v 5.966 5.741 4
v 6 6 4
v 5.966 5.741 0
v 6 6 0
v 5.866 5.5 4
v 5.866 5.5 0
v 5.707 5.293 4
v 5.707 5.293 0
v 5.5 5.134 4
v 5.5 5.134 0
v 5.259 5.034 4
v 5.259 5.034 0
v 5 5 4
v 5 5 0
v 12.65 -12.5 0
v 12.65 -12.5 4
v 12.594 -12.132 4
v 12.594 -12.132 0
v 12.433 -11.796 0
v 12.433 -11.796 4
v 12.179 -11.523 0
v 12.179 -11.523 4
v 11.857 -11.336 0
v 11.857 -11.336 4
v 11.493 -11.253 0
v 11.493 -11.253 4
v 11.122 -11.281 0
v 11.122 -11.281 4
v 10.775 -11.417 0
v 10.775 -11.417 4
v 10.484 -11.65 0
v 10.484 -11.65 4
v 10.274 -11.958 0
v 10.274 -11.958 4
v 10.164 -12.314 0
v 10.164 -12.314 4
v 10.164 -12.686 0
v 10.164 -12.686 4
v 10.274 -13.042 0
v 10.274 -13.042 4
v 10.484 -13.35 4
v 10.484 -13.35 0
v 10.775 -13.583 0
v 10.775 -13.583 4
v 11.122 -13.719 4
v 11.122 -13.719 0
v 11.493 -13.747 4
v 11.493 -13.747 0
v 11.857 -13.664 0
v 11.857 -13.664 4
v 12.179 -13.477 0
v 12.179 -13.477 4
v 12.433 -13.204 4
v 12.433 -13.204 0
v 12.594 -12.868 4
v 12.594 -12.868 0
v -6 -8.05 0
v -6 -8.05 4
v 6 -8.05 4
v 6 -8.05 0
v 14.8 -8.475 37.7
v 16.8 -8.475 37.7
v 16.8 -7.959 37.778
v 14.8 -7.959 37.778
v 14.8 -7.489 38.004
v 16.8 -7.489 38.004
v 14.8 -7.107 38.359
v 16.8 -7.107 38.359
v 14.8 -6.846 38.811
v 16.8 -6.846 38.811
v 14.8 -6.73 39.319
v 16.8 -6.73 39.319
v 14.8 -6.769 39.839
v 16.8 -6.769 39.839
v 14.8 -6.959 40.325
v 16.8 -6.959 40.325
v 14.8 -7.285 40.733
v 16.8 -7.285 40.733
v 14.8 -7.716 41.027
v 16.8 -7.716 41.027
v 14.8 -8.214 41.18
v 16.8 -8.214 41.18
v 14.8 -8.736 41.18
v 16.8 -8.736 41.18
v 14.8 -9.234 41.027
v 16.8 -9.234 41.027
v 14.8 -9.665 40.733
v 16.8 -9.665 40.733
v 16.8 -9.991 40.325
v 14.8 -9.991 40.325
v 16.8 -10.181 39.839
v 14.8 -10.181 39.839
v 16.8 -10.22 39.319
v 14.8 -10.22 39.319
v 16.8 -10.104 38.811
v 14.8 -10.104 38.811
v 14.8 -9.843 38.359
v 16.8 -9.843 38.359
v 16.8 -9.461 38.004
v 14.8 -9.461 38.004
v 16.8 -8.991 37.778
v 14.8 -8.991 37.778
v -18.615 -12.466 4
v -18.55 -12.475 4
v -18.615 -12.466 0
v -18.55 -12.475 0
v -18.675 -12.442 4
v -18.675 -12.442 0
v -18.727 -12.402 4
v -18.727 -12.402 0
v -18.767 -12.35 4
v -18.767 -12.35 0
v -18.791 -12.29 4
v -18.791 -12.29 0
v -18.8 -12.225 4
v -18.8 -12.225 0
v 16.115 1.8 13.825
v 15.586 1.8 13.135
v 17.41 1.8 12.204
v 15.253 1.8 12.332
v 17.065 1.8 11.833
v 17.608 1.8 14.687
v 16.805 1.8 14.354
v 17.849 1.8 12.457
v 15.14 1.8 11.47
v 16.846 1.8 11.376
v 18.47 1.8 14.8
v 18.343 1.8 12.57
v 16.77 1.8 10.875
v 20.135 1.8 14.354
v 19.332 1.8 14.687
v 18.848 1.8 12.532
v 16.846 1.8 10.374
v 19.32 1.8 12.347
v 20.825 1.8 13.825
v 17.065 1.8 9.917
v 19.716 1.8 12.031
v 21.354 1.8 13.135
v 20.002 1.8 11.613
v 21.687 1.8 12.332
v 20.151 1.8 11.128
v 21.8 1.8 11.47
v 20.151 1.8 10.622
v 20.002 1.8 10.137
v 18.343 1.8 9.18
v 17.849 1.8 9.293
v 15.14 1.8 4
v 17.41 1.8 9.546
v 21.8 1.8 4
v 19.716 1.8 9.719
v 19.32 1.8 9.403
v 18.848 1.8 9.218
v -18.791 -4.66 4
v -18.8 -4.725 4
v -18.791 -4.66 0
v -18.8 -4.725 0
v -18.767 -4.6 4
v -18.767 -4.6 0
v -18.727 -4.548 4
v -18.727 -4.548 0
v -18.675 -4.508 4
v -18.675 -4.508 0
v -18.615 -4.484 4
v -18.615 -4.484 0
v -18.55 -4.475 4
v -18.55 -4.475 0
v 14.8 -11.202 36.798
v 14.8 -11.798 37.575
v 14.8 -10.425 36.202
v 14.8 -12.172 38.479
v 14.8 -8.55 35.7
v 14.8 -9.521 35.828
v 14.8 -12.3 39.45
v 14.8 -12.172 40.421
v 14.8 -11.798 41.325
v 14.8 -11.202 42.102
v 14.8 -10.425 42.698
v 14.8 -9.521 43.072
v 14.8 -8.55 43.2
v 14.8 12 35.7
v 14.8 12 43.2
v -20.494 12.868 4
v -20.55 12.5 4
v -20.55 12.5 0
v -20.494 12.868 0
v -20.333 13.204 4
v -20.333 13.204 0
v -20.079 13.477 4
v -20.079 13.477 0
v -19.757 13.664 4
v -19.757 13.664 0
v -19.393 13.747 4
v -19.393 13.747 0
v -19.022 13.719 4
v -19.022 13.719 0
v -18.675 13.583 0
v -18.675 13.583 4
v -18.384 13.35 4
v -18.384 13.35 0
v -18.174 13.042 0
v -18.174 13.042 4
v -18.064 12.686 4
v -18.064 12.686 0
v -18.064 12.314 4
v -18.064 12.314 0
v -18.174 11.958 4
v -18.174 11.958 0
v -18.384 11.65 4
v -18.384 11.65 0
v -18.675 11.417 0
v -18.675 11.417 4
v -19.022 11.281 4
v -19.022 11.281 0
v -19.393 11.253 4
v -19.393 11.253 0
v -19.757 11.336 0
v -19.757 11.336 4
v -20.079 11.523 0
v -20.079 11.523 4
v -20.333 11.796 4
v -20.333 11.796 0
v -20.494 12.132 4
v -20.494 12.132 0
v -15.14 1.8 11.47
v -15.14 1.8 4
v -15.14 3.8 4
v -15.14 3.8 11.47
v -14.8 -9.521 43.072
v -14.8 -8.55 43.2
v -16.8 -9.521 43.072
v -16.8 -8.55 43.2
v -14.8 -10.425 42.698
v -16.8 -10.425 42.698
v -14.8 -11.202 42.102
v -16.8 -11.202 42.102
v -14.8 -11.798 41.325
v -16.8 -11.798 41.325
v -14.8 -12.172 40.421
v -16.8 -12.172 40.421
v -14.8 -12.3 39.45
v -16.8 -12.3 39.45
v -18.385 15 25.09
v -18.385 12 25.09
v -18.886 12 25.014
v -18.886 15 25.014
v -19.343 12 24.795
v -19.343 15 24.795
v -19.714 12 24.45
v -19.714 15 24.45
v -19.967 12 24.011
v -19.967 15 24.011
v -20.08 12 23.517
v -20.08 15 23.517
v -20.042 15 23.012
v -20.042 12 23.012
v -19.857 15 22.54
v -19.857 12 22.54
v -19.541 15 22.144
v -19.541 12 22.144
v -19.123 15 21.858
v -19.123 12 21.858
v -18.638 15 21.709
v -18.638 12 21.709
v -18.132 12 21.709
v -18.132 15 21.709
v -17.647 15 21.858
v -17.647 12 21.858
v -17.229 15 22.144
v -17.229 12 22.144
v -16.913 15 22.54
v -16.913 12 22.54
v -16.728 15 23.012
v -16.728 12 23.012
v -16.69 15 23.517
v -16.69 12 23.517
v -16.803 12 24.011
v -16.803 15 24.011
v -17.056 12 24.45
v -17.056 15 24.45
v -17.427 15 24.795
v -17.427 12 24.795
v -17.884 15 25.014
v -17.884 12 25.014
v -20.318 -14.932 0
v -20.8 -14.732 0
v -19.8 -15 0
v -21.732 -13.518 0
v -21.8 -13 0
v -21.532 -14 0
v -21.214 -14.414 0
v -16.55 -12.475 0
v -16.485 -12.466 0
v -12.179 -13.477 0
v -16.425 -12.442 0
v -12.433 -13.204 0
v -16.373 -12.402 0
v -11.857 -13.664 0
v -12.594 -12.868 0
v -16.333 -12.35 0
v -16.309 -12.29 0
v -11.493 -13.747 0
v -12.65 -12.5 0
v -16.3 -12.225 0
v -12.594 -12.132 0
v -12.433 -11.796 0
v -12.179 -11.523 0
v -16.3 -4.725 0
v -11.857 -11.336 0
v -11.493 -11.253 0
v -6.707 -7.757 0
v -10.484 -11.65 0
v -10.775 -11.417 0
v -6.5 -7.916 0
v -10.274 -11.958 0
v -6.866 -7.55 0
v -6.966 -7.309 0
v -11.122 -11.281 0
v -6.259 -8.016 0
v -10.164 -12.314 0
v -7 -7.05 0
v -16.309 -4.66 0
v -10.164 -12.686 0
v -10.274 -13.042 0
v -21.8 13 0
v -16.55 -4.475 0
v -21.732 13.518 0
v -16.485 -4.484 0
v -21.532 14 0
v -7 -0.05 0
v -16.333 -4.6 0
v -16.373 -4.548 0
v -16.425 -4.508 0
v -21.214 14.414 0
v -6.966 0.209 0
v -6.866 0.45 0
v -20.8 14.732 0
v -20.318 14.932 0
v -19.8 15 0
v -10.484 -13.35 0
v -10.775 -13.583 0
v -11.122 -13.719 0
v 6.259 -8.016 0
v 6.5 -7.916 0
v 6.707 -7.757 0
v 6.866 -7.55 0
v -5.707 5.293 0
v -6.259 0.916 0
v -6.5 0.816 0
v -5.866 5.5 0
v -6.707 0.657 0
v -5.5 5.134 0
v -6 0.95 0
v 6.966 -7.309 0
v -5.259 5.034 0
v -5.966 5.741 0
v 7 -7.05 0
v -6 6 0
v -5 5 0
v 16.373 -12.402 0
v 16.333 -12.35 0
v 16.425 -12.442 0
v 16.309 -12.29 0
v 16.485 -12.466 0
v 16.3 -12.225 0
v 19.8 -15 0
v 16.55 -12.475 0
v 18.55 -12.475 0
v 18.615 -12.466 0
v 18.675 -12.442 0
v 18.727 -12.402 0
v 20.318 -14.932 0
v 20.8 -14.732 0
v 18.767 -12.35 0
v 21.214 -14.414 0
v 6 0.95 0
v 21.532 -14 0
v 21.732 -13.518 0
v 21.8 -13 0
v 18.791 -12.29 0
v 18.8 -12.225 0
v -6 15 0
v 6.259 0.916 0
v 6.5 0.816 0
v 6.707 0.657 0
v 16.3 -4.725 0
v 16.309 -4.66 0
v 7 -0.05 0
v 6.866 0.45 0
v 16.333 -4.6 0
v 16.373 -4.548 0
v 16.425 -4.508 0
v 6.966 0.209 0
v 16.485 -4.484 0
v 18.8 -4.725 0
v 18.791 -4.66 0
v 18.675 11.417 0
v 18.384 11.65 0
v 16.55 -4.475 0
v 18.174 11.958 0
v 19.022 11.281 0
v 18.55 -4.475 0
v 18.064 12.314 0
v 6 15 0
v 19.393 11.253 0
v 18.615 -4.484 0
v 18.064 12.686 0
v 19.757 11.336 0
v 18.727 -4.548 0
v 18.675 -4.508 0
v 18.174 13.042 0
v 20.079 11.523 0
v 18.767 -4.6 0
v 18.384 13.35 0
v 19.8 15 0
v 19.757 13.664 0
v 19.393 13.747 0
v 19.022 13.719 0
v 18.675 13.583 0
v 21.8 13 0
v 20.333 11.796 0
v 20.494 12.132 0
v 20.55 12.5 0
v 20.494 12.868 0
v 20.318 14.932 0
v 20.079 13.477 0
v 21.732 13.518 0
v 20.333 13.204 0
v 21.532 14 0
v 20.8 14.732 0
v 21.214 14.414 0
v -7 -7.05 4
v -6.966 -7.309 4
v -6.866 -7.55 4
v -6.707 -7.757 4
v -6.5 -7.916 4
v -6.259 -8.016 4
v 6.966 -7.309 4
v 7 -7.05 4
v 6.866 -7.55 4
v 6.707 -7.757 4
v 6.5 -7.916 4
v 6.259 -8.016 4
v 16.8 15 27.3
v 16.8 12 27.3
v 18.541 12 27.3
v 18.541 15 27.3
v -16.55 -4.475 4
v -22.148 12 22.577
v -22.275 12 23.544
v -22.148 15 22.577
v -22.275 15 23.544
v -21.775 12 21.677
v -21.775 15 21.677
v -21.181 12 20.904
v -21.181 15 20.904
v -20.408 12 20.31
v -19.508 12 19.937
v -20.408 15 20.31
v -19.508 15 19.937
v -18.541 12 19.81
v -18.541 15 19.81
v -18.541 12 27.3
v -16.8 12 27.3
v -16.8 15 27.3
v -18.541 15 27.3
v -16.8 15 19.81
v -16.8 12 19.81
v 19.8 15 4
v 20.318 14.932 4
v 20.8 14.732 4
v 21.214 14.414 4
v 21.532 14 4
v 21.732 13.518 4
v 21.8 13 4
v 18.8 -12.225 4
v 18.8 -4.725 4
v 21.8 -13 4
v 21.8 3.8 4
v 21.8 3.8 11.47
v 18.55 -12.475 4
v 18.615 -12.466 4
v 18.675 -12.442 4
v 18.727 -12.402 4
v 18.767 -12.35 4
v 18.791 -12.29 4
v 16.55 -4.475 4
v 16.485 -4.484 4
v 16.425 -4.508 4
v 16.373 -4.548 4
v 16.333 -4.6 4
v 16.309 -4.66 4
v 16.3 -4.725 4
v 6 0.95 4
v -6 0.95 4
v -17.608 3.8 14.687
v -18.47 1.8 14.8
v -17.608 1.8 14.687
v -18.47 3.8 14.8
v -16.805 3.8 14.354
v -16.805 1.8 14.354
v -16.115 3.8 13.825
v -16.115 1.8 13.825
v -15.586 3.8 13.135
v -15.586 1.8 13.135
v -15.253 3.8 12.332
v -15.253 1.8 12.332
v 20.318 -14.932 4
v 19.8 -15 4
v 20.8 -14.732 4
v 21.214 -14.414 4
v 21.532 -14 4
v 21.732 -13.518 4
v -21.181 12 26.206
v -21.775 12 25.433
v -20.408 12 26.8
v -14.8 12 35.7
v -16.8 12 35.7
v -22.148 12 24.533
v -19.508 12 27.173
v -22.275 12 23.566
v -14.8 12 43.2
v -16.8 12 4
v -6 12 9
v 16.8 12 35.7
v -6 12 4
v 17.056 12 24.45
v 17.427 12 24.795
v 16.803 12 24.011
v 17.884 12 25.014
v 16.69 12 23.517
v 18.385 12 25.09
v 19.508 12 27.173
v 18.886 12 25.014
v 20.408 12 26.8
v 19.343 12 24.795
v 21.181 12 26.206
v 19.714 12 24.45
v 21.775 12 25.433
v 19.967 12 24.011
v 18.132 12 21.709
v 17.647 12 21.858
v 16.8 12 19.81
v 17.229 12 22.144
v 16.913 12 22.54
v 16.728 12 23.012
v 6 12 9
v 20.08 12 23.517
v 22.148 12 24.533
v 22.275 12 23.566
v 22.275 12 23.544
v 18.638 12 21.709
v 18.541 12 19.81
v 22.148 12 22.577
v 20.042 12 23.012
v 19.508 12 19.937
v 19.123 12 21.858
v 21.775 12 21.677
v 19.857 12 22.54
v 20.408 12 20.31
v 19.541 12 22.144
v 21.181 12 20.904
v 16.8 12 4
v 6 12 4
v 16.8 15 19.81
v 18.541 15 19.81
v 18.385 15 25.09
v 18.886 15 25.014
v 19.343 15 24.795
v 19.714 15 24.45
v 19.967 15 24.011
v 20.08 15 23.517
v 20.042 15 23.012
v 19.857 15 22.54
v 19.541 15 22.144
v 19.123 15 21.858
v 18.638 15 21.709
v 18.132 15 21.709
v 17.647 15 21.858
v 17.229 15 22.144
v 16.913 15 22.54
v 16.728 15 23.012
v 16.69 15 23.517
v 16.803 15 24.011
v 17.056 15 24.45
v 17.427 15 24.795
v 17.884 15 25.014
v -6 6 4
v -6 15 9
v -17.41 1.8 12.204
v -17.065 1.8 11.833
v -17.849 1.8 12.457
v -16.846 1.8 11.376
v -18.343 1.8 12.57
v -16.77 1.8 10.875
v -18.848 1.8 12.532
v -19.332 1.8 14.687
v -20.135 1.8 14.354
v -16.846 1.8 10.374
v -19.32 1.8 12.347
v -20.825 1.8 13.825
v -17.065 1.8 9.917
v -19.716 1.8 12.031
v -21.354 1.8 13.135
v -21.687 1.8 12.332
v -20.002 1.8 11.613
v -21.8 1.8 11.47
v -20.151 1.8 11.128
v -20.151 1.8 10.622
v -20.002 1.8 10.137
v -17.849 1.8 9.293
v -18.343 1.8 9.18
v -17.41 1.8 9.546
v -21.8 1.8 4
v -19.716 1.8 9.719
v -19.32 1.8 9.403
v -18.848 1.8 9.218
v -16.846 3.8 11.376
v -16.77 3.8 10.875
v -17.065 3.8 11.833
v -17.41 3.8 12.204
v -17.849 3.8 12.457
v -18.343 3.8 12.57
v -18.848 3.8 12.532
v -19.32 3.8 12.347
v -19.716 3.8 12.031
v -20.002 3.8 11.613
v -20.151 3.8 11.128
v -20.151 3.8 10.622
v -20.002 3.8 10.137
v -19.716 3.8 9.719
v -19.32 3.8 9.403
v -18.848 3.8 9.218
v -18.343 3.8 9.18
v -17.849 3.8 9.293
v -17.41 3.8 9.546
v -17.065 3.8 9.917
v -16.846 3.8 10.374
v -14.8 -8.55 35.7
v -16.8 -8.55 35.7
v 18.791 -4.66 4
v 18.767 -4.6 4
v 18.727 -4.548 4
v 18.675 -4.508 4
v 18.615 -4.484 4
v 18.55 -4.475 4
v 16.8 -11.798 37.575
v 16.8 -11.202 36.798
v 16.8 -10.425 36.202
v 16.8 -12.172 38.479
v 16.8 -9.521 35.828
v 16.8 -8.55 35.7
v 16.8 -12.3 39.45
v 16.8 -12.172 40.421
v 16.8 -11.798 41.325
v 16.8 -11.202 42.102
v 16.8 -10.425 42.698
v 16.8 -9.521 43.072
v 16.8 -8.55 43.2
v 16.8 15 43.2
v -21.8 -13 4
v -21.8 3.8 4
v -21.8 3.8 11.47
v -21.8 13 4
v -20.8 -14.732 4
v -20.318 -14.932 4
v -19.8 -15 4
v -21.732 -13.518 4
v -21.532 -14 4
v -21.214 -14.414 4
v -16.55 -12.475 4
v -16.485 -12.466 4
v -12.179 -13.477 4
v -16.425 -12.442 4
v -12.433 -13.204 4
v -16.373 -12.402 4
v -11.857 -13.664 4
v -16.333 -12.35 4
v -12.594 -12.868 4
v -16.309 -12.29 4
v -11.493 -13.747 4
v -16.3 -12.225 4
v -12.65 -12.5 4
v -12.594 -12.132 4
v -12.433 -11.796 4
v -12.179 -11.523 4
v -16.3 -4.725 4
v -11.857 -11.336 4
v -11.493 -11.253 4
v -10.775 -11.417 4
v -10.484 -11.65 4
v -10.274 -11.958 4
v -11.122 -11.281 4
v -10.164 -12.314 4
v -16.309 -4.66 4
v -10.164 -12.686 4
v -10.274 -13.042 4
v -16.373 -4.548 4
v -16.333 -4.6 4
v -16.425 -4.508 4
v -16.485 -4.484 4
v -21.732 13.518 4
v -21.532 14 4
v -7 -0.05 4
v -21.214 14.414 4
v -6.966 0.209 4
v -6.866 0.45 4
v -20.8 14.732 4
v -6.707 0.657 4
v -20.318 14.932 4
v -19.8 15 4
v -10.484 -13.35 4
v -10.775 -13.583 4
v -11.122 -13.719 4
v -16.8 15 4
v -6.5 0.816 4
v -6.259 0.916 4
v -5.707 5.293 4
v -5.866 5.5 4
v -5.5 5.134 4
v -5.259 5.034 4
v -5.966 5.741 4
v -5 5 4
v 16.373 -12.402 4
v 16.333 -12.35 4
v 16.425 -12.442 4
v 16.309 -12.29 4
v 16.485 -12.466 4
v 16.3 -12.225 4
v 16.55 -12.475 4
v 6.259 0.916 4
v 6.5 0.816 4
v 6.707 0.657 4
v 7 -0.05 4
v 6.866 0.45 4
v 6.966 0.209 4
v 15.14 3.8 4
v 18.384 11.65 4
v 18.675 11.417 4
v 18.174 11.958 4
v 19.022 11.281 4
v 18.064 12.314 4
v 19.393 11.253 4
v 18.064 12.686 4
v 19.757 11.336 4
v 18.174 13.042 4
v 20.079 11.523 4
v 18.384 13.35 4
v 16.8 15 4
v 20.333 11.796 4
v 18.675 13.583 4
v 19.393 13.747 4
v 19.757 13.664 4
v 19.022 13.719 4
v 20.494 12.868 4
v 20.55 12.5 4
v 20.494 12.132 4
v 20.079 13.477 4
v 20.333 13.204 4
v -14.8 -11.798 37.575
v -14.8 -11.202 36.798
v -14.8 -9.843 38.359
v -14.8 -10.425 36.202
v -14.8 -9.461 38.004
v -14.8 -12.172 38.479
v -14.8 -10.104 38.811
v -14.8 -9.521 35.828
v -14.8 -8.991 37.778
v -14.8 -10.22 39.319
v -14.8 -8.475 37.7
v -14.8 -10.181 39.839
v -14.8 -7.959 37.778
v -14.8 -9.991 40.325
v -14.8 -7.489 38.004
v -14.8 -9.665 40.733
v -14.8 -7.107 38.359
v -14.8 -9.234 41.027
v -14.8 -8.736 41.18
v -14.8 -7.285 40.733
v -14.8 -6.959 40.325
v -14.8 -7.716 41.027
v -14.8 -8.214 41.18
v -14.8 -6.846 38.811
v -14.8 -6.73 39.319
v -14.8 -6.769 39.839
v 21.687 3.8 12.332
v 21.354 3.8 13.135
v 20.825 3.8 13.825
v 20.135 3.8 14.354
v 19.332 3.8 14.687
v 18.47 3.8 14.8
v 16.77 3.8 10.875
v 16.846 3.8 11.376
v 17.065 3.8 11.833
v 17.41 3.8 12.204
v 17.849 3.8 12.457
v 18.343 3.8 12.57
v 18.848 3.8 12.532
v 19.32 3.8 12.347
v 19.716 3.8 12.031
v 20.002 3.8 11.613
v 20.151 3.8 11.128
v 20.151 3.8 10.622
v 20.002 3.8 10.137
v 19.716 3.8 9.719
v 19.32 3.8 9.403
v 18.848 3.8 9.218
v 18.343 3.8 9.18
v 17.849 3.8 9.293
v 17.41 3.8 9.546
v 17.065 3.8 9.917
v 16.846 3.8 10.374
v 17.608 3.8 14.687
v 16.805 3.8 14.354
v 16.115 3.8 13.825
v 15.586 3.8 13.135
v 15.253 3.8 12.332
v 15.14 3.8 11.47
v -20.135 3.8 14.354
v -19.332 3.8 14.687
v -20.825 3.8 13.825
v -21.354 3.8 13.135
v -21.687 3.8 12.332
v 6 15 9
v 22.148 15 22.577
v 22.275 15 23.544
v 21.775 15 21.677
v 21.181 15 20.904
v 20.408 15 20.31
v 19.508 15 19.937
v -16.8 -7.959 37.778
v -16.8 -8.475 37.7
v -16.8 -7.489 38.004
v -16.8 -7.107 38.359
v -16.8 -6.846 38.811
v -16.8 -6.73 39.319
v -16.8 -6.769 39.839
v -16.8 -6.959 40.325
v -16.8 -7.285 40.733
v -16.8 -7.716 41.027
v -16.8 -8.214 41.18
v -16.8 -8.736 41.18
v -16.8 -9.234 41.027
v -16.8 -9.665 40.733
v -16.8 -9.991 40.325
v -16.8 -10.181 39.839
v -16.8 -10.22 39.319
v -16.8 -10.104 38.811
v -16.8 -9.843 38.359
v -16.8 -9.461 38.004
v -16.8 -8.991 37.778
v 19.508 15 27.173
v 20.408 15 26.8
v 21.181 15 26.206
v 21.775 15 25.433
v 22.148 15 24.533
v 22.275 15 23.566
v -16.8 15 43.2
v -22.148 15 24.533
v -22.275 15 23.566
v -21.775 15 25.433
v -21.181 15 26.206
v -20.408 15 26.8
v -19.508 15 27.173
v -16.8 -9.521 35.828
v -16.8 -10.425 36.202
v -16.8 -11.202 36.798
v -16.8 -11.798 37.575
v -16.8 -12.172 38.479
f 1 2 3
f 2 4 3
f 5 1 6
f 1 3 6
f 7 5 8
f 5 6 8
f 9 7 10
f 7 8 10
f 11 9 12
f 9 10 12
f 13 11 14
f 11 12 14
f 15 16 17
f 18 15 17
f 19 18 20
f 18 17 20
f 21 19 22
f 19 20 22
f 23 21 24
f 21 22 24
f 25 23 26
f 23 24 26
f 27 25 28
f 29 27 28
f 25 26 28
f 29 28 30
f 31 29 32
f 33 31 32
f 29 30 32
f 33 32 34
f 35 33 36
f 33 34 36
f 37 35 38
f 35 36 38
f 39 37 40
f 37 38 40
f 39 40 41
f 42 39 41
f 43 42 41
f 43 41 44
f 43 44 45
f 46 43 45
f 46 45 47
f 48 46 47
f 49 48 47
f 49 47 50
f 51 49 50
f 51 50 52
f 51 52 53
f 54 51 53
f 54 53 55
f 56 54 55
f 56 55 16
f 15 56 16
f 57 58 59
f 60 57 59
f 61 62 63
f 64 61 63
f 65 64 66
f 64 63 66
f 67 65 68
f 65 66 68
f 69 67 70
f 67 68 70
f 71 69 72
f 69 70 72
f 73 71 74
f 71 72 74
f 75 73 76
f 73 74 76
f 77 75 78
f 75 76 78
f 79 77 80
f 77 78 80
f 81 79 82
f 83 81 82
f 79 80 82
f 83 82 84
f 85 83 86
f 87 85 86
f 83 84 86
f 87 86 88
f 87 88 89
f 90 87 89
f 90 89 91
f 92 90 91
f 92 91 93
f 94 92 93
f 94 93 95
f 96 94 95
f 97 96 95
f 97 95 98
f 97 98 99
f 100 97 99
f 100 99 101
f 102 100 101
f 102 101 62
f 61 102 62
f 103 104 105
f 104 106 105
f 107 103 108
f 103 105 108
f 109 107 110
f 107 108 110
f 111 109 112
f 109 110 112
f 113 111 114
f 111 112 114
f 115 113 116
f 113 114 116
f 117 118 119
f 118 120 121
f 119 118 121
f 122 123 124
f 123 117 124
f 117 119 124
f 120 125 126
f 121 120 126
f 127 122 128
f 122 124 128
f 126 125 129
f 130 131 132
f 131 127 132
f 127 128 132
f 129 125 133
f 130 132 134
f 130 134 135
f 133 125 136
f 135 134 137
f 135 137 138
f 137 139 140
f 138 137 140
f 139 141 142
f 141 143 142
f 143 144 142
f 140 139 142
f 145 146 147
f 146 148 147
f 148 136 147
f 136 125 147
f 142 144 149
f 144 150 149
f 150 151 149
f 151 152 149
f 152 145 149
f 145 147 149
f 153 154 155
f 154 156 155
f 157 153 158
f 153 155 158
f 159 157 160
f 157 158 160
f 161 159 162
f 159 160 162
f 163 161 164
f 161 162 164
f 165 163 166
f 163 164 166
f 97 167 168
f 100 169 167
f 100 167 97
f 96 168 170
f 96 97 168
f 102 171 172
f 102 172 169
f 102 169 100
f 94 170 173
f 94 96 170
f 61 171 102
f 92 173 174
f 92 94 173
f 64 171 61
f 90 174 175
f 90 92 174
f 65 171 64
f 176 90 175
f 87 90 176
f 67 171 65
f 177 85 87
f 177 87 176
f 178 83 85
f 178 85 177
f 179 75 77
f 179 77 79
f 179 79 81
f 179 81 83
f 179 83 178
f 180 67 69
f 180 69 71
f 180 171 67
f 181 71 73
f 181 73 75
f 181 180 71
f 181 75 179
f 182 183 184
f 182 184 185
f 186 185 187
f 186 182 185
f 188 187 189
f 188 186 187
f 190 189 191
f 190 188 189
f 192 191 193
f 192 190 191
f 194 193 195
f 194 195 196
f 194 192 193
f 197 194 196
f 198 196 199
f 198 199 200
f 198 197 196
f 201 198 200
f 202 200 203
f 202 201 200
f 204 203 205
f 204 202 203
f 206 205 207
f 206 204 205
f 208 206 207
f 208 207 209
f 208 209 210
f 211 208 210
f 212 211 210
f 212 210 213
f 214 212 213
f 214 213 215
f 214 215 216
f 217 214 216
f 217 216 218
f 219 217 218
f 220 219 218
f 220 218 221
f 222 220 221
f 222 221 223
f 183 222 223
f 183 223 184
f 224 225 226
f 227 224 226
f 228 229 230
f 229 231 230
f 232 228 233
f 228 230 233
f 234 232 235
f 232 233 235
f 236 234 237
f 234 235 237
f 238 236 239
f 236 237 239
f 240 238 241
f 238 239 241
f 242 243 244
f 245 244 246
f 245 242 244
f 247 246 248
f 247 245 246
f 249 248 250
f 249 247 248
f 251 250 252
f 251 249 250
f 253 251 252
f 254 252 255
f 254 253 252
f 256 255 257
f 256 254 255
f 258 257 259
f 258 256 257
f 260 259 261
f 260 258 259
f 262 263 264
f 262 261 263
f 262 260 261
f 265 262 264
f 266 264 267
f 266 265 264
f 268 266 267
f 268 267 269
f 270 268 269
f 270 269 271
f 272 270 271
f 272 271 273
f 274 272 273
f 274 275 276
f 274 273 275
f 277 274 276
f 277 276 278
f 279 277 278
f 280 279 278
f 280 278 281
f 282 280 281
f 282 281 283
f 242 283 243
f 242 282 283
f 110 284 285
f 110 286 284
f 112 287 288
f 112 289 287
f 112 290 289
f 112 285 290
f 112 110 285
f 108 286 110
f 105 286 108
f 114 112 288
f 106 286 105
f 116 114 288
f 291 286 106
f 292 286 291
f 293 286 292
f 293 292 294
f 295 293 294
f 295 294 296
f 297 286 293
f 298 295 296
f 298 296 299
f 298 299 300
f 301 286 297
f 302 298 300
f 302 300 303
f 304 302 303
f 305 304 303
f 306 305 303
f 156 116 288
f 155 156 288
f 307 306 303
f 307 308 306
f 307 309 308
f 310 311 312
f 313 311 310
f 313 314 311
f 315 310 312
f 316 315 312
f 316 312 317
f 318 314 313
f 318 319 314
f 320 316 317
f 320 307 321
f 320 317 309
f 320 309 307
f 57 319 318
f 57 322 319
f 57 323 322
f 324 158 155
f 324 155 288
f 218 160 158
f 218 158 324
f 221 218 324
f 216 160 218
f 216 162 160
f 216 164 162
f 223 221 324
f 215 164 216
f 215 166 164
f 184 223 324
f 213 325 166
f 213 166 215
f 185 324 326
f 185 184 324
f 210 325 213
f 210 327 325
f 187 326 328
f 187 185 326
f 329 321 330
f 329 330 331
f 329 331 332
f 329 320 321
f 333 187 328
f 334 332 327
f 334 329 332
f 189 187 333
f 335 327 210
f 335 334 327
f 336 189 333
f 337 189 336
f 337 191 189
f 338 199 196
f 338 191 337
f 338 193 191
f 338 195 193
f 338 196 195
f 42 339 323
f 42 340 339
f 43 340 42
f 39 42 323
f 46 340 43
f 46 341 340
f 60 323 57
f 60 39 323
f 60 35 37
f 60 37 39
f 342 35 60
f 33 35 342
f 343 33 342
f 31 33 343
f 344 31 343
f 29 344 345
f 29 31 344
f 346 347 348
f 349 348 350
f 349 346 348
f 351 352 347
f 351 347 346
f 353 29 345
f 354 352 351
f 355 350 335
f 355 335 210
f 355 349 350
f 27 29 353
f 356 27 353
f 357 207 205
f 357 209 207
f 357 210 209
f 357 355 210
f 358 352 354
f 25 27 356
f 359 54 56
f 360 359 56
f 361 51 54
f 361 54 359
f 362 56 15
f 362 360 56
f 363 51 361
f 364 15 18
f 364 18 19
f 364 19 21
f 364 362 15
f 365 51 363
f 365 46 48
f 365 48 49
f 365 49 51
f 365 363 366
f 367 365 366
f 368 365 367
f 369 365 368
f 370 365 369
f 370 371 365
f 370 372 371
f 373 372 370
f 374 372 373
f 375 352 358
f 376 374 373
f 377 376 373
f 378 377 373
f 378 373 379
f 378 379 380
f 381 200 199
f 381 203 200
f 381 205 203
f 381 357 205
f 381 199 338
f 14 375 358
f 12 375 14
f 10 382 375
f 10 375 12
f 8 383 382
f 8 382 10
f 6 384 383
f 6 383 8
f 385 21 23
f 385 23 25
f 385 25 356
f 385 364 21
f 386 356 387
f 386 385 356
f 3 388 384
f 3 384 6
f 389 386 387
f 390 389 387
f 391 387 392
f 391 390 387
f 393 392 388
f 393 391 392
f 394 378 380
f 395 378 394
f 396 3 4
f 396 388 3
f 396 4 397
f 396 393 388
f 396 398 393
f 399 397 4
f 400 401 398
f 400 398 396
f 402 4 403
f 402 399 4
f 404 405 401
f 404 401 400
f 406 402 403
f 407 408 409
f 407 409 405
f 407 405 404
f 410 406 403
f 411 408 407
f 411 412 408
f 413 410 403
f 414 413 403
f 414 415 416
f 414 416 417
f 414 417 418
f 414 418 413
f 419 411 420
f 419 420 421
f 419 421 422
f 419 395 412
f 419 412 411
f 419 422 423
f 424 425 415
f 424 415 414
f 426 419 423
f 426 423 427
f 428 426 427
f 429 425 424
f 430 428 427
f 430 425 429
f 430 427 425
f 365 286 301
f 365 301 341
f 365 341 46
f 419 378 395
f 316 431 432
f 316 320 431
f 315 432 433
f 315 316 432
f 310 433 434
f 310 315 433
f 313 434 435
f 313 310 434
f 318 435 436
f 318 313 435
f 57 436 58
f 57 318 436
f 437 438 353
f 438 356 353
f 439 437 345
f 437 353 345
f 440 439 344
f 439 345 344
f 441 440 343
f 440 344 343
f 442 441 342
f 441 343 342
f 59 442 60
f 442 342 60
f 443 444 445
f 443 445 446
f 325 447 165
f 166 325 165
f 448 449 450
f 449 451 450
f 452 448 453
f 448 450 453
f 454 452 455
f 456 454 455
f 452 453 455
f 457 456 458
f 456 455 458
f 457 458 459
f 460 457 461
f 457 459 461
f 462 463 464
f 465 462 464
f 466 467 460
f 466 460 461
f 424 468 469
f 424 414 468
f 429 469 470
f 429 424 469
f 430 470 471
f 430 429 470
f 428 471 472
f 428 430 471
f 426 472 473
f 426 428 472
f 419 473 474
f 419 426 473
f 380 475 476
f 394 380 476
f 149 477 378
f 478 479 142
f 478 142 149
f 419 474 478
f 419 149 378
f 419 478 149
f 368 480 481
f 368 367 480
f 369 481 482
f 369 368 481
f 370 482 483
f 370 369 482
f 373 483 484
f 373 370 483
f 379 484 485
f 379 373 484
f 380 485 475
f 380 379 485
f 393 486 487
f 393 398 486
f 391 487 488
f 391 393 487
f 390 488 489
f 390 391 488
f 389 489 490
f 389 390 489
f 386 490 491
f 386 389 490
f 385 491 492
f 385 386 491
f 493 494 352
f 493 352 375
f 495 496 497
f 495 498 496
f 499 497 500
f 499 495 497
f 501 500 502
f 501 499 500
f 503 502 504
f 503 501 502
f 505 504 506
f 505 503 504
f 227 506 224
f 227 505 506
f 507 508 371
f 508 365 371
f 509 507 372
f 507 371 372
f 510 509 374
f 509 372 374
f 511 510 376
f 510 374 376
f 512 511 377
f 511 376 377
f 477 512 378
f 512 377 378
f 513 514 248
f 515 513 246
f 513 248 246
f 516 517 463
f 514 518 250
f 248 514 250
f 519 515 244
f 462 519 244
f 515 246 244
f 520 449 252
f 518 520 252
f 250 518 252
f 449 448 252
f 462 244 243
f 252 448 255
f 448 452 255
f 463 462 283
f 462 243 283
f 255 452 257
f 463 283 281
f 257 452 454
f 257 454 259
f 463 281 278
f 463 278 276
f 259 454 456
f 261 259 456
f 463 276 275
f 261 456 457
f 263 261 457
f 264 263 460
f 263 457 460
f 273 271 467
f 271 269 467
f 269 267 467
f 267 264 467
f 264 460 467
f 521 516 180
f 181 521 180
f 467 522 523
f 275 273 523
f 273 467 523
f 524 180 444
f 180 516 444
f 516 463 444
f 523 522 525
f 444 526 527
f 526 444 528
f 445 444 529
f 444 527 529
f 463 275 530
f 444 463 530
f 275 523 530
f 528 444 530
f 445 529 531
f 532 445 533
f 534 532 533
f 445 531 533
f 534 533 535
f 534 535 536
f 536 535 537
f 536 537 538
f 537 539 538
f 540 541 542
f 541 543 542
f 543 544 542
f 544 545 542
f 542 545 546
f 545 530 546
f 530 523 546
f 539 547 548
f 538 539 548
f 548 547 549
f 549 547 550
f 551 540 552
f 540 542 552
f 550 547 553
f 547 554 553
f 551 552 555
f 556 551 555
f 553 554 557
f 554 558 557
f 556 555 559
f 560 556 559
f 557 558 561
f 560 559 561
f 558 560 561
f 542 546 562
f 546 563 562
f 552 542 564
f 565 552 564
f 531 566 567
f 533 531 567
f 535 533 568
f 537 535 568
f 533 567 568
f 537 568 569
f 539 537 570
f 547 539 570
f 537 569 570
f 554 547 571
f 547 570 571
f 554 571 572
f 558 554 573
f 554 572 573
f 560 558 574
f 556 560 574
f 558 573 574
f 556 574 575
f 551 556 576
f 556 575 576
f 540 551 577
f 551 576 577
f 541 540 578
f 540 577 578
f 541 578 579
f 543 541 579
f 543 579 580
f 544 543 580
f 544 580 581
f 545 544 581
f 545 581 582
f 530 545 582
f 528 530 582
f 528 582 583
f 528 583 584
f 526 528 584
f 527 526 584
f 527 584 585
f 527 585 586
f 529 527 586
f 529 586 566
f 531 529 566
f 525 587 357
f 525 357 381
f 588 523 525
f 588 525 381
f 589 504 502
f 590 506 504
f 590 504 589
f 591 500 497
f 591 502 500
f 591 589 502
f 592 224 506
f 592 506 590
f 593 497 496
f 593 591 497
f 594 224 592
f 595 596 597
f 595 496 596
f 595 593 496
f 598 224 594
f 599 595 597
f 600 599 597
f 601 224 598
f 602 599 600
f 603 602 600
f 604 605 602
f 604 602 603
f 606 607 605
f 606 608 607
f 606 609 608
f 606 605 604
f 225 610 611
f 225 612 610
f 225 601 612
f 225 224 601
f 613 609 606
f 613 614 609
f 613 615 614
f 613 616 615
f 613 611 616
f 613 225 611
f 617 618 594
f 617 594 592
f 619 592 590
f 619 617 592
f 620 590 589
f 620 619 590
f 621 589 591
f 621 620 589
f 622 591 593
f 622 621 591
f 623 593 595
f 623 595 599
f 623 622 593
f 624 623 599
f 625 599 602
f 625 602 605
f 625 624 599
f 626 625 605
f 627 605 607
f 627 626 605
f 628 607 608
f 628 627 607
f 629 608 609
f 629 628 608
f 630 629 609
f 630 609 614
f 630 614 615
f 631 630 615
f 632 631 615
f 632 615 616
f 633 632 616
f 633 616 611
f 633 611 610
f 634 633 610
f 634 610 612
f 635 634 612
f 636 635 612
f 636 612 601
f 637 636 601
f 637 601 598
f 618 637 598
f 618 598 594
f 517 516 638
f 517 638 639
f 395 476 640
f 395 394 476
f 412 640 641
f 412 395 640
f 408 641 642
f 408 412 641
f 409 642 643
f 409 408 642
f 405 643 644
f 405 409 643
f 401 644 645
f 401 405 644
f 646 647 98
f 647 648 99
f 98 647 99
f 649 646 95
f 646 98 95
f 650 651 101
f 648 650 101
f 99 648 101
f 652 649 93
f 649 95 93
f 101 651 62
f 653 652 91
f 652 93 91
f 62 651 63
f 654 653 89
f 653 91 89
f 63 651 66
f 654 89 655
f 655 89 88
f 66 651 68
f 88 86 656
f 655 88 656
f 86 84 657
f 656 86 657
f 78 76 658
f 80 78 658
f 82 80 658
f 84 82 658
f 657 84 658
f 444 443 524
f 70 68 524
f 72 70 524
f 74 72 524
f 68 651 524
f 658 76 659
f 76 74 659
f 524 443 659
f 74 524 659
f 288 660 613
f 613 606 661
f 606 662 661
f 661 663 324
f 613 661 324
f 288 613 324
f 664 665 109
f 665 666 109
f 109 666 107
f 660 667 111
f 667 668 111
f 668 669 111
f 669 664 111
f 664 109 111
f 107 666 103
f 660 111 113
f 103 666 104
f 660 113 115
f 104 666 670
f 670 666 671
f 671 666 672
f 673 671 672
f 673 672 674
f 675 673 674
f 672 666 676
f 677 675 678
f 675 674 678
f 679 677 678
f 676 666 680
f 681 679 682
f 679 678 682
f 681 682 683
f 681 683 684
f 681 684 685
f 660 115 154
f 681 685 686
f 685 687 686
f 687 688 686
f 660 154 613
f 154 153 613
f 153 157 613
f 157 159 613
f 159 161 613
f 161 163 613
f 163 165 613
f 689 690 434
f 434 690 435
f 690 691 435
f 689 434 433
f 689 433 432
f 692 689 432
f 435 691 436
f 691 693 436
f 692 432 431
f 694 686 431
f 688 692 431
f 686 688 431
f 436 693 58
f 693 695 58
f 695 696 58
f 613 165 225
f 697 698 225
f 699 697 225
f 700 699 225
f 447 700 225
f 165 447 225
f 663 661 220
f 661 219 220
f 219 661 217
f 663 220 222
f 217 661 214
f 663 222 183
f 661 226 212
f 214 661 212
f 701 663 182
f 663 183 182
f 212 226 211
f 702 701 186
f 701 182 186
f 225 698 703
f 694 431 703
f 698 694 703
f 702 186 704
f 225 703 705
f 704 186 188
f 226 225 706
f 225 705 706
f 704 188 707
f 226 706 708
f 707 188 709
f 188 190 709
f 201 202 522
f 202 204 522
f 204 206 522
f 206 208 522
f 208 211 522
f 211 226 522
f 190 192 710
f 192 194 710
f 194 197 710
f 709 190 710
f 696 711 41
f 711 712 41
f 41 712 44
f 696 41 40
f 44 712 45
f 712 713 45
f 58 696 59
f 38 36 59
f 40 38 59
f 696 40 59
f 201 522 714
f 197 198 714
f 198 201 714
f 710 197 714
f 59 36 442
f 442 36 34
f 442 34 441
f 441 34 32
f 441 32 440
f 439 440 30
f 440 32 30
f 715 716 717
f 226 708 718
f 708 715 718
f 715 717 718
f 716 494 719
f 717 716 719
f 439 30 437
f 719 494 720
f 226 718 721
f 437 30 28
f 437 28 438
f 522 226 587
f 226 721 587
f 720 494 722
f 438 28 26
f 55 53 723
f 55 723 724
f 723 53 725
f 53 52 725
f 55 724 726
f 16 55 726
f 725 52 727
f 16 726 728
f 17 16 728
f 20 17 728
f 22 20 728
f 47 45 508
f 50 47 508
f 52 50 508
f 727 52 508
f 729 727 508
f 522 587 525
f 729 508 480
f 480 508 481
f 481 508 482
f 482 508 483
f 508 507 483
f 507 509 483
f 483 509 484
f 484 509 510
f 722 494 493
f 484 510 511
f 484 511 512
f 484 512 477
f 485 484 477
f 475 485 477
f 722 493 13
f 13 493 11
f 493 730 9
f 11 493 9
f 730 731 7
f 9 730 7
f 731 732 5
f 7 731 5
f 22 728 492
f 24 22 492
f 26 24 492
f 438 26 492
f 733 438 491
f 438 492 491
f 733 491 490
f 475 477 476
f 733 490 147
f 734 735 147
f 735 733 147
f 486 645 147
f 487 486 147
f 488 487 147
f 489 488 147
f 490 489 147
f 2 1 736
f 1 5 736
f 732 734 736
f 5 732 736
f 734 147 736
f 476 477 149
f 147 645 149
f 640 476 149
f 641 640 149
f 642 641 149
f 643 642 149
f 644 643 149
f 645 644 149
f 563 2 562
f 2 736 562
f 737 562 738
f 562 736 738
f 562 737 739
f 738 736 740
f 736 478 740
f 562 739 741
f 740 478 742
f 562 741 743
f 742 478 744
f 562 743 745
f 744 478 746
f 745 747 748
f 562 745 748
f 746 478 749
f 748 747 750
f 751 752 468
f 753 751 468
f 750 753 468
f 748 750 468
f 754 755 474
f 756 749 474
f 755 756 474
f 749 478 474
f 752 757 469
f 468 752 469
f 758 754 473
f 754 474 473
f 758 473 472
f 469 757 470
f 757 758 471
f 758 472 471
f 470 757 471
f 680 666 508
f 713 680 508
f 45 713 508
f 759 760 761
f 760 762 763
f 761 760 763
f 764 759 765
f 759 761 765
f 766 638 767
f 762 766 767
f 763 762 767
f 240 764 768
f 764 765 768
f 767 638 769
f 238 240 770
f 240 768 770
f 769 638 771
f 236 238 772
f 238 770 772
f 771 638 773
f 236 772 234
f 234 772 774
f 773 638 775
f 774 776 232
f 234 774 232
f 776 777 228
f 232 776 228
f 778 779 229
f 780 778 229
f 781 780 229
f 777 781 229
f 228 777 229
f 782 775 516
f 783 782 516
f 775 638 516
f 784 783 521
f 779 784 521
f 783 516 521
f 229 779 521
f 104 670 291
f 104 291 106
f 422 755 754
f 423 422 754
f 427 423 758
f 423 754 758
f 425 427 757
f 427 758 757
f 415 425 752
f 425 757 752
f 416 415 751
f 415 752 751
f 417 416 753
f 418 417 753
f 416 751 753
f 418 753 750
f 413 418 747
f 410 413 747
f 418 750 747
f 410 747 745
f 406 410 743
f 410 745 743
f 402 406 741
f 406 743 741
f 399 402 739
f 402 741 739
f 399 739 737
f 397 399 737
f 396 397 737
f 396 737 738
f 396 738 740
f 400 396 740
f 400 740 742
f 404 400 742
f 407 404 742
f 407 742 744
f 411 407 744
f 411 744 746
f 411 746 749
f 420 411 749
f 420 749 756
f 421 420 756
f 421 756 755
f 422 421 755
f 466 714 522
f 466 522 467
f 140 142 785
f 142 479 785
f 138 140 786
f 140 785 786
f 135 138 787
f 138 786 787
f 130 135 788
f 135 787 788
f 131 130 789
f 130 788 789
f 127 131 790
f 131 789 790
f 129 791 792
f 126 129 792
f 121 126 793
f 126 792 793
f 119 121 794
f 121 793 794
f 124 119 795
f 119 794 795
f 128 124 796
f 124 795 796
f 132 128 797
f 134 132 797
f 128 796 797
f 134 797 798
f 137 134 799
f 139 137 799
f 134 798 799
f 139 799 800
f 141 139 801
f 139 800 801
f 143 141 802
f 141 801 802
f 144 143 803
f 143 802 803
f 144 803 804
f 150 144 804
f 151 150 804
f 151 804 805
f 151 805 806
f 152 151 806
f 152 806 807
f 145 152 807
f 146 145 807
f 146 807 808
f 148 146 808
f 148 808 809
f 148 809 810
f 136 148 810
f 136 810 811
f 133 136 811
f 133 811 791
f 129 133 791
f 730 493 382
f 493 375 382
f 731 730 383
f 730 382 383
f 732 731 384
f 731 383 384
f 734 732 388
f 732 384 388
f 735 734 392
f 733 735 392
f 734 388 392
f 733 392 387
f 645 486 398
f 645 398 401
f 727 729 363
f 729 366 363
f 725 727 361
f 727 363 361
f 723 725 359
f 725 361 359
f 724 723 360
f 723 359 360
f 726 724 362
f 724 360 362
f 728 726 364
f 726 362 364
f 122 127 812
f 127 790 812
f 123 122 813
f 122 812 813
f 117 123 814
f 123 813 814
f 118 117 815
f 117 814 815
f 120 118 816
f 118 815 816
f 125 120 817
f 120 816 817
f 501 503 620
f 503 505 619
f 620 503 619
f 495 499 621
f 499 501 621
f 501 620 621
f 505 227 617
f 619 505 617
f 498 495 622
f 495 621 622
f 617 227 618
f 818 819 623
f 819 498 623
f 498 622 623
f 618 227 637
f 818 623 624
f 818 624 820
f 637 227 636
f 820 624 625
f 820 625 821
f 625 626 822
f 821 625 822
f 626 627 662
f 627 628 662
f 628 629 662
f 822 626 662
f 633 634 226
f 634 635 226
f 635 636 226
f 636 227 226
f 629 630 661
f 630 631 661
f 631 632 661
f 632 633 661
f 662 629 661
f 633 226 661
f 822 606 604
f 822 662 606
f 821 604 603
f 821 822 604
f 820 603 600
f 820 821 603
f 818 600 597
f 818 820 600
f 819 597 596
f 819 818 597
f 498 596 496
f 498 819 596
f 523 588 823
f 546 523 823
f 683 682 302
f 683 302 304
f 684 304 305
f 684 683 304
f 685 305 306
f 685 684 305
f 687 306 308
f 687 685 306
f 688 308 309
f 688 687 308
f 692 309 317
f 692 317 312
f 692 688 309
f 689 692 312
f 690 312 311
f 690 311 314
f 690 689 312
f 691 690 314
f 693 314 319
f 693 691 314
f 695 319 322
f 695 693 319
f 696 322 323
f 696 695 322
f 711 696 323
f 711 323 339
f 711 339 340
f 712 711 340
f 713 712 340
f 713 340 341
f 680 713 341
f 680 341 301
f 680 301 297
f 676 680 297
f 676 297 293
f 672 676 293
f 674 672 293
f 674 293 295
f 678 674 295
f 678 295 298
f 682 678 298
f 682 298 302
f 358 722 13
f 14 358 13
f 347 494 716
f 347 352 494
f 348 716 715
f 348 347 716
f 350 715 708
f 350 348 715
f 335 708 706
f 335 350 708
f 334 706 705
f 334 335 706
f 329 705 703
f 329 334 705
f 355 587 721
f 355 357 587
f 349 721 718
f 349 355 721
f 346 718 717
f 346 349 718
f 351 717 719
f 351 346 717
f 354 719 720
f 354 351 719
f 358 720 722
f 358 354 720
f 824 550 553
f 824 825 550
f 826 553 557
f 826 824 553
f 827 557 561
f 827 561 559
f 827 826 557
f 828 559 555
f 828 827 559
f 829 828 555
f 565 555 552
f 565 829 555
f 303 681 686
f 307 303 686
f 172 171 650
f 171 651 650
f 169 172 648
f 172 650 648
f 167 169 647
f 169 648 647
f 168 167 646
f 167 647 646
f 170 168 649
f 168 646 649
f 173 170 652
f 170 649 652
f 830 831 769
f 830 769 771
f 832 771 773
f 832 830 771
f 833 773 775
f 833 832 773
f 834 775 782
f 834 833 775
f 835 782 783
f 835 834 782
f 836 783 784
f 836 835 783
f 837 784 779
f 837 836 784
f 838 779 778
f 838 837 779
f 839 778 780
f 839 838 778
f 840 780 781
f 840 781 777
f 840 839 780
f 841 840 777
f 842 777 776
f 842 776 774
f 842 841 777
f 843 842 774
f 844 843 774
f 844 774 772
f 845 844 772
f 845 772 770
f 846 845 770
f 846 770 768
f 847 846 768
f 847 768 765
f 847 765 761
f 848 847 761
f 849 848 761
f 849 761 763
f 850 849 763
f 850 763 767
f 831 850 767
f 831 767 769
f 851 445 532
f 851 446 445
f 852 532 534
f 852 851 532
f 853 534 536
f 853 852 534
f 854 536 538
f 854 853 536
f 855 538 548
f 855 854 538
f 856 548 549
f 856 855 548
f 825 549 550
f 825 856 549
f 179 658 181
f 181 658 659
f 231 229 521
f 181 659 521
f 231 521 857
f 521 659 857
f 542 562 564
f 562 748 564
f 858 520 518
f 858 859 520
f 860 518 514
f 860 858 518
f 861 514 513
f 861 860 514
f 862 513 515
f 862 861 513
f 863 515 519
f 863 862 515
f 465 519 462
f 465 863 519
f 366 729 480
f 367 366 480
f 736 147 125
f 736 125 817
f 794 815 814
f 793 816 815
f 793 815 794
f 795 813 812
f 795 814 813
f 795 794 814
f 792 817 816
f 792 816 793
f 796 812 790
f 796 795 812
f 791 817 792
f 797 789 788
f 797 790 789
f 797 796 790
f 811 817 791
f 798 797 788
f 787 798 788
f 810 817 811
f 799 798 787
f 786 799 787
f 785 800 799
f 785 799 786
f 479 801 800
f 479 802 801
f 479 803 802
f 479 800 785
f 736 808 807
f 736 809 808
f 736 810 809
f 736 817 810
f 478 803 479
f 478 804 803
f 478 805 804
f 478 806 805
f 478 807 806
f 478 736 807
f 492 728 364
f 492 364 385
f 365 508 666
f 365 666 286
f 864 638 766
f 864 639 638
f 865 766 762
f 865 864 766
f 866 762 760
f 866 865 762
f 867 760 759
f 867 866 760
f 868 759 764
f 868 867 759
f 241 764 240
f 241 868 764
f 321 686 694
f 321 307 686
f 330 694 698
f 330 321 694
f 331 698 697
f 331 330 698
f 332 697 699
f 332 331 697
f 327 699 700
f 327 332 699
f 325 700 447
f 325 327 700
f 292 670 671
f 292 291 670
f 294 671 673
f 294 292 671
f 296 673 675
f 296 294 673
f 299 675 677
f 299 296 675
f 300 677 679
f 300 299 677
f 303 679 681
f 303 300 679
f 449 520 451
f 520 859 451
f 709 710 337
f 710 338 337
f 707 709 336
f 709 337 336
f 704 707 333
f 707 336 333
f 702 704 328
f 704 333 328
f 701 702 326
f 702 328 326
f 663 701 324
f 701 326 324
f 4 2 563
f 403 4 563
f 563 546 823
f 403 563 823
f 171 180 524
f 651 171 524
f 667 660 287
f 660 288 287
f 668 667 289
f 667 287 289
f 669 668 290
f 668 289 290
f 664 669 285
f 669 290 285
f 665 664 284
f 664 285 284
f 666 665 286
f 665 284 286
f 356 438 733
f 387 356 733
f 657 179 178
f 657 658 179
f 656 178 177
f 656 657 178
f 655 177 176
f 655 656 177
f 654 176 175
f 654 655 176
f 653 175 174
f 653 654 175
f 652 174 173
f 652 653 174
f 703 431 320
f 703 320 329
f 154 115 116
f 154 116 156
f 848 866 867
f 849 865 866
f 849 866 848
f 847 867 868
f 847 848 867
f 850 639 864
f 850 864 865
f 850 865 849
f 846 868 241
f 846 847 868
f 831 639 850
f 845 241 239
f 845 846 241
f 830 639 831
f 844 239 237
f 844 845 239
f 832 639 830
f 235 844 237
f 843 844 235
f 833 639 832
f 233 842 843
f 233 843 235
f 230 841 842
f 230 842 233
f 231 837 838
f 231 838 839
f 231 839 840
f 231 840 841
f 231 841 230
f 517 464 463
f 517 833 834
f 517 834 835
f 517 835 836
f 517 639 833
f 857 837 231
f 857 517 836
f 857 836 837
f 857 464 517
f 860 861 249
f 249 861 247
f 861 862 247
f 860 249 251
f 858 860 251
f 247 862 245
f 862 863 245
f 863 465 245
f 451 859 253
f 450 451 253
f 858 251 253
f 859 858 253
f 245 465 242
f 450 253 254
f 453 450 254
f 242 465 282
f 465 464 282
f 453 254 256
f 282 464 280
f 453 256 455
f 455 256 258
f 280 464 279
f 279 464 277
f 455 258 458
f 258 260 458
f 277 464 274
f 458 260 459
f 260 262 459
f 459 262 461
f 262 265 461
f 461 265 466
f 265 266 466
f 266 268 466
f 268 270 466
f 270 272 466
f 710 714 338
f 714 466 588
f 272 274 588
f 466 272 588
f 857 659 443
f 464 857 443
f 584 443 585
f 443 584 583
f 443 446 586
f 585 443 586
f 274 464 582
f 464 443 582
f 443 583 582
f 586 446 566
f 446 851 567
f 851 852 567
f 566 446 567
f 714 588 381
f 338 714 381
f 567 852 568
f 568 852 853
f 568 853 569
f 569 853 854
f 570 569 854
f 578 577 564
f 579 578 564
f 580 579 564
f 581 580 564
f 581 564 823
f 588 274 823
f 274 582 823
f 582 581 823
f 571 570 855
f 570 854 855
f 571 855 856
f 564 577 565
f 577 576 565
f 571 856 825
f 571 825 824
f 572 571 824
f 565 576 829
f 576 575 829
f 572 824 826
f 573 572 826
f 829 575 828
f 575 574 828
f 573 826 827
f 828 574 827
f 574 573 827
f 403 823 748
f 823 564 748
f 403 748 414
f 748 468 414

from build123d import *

# Parameters (mm, degrees)
SKETCH1_W                = 33.6
SKETCH1_H                = 30
BOSS_EXTRUDE1_DEPTH      = 4
SKETCH3_W                = 33.6
SKETCH3_H                = 3
BOSS_EXTRUDE2_DEPTH      = 39.2
SKETCH5_W                = 14
SKETCH5_H                = 9
CUT_EXTRUDE2_DEPTH       = 30
SKETCH8_W                = 12
SKETCH8_H                = 7
CUT_EXTRUDE4_DEPTH       = 46.20929108
SKETCH10_W               = 2
SKETCH10_H               = 7.5
BOSS_EXTRUDE3_DEPTH      = 24.3
SKETCH12_W               = 4
SKETCH12_H               = 30
BOSS_EXTRUDE4_DEPTH      = 5
SKETCH13_W               = 2.5
SKETCH13_H               = 8
CUT_EXTRUDE5_DEPTH       = 48.295665763
FILLET3_R                = 0.25
FILLET4_R                = 1
CUT_EXTRUDE6_REACH       = 58.747
SKETCH15_R               = 1.75
FILLET6_R                = 3.75
CUT_EXTRUDE8_REACH       = 49.296
SKETCH23_R               = 1.25
FILLET8_R                = 2
CUT_EXTRUDE9_REACH       = 58.934
SKETCH24_W               = 12
SKETCH24_H               = 18
ESBO_O1_W                = 7.49
ESBO_O1_H                = 3
RESSALTO_EXTRUS_O1_DEPTH = 5.475
FILETE1_R                = 3.7338
FILETE2_R                = 3.7338
ESBO_O2_R                = 1.7
CORTE_EXTRUS_O1_DEPTH    = 5
ESBO_O3_W                = 6.66
ESBO_O3_H                = 2
RESSALTO_EXTRUS_O2_DEPTH = 10.8
CORTE_EXTRUS_O2_REACH    = 54.114
ESBO_O5_R                = 1.7
FILETE3_R                = 3.33
FILETE4_R                = 3.33
FILLET3_OF_ESPELHAR5_R   = 0.25
FILLET6_OF_ESPELHAR5_R   = 3.75
FILLET8_OF_ESPELHAR5_R   = 2
FILETE1_OF_ESPELHAR5_R   = 3.7338
FILETE2_OF_ESPELHAR5_R   = 3.7338
FILETE3_OF_ESPELHAR5_R   = 3.33
FILETE4_OF_ESPELHAR5_R   = 3.33


with BuildPart() as part:
    # Sketch1 → Boss-Extrude1 (new body)
    with BuildSketch(Plane.XY):
        Rectangle(SKETCH1_W, SKETCH1_H)
    extrude(amount=BOSS_EXTRUDE1_DEPTH)

    # Sketch3 → Boss-Extrude2 (add)
    with BuildSketch(Plane.XY.offset(4)):
        with Locations((0, 13.5)):
            Rectangle(SKETCH3_W, SKETCH3_H)
    extrude(amount=BOSS_EXTRUDE2_DEPTH)

    # Sketch5 → Cut-Extrude2 (cut)
    with BuildSketch(Plane.XY.offset(4)):
        with Locations((0, -3.55)):
            Rectangle(SKETCH5_W, SKETCH5_H)
    extrude(amount=-CUT_EXTRUDE2_DEPTH, mode=Mode.SUBTRACT)

    # Sketch8 → Cut-Extrude4 (cut, through all)
    with BuildSketch(Plane.XY.offset(4)):
        with Locations((0, 8.5)):
            Rectangle(SKETCH8_W, SKETCH8_H)
    extrude(amount=-CUT_EXTRUDE4_DEPTH, mode=Mode.SUBTRACT)

    # Sketch10 → Boss-Extrude3 (add)
    with BuildSketch(Plane.XZ.offset(-12)):
        with Locations((15.8, 39.45)):
            Rectangle(SKETCH10_W, SKETCH10_H)
    boss_extrude3 = extrude(amount=BOSS_EXTRUDE3_DEPTH)

    # Sketch12 → Boss-Extrude4 (add)
    with BuildSketch(Plane(origin=(16.8, 0, 0), x_dir=(0, 0, -1), z_dir=(1, 0, 0))):
        with Locations((-2, 0)):
            Rectangle(SKETCH12_W, SKETCH12_H)
    boss_extrude4 = extrude(amount=BOSS_EXTRUDE4_DEPTH)

    # Sketch13 → Cut-Extrude5 (cut, through all)
    with BuildSketch(Plane.XY.offset(4)):
        with Locations((17.55, -8.475)):
            Rectangle(SKETCH13_W, SKETCH13_H)
    cut_extrude5 = extrude(amount=-CUT_EXTRUDE5_DEPTH, mode=Mode.SUBTRACT)

    # Fillet3
    fillet3_edges = [part.edges().sort_by_distance(p)[0] for p in [
        (18.8, -4.475, 2),
        (18.8, -12.475, 2),
        (16.3, -12.475, 2),
        (16.3, -4.475, 2),
    ]]
    fillet(fillet3_edges, radius=FILLET3_R)

    # Fillet4
    fillet4_edges = [part.edges().sort_by_distance(p)[0] for p in [
        (7, 0.95, 2),
        (7, -8.05, 2),
        (-7, -8.05, 2),
        (-7, 0.95, 2),
        (6, 5, 2),
        (-6, 5, 2),
    ]]
    fillet(fillet4_edges, radius=FILLET4_R)

    # Sketch15 → Cut-Extrude6 (cut, up to next)
    with BuildSketch(Plane(origin=(16.8, 0, 0), x_dir=(0, 0, -1), z_dir=(1, 0, 0)), mode=Mode.PRIVATE) as cut_extrude6_sk1:
        with Locations((-39.45, -8.475)):
            Circle(SKETCH15_R)
    cut_extrude6_tool1 = extrude(cut_extrude6_sk1.sketch, amount=-CUT_EXTRUDE6_REACH, mode=Mode.PRIVATE) & part.part
    cut_extrude6 = cut_extrude6_tool1.solids().sort_by_distance((16.8, -8.475, 39.45))[0]
    add(cut_extrude6, mode=Mode.SUBTRACT)

    # Fillet6
    fillet6_edges = [part.edges().sort_by_distance(p)[0] for p in [
        (15.8, -12.3, 35.7),
        (15.8, -12.3, 43.2),
    ]]
    fillet(fillet6_edges, radius=FILLET6_R - 0.0001)  # a hair under: the kernel refuses the full size

    # Sketch23 → Cut-Extrude8 (cut, up to next)
    with BuildSketch(Plane.XY.offset(4), mode=Mode.PRIVATE) as cut_extrude8_sk1:
        with Locations((11.4, -12.5)):
            Circle(SKETCH23_R)
    cut_extrude8_tool1 = extrude(cut_extrude8_sk1.sketch, amount=-CUT_EXTRUDE8_REACH, mode=Mode.PRIVATE) & part.part
    # Sketch23 → Cut-Extrude8 (cut, up to next)
    with BuildSketch(Plane.XY.offset(4), mode=Mode.PRIVATE) as cut_extrude8_sk2:
        with Locations((19.3, 12.5)):
            Circle(SKETCH23_R)
    cut_extrude8_tool2 = extrude(cut_extrude8_sk2.sketch, amount=-CUT_EXTRUDE8_REACH, mode=Mode.PRIVATE) & part.part
    cut_extrude8_1 = cut_extrude8_tool1.solids().sort_by_distance((11.4, -12.5, 4))[0]
    add(cut_extrude8_1, mode=Mode.SUBTRACT)
    cut_extrude8_2 = cut_extrude8_tool2.solids().sort_by_distance((19.3, 12.5, 4))[0]
    add(cut_extrude8_2, mode=Mode.SUBTRACT)
    cut_extrude8 = cut_extrude8_1 + cut_extrude8_2  # Cut-Extrude8 as one shape, for the pattern or mirror that repeats it

    # Fillet8
    fillet8_edges = [part.edges().sort_by_distance(p)[0] for p in [
        (21.8, 15, 2),
        (21.8, -15, 2),
    ]]
    fillet(fillet8_edges, radius=FILLET8_R)

    # Sketch24 → Cut-Extrude9 (cut, up to next)
    with BuildSketch(Plane(origin=(0, 15, 0), x_dir=(1, 0, 0), z_dir=(0, 1, 0)), mode=Mode.PRIVATE) as cut_extrude9_sk1:
        Rectangle(SKETCH24_W, SKETCH24_H)
    cut_extrude9_tool1 = extrude(cut_extrude9_sk1.sketch, amount=-CUT_EXTRUDE9_REACH, mode=Mode.PRIVATE) & part.part
    add(cut_extrude9_tool1.solids().sort_by_distance((0, 15, 0))[0], mode=Mode.SUBTRACT)

    # Esboço1 → Ressalto-extrusão1 (add)
    with BuildSketch(Plane(origin=(16.8, 0, 0), x_dir=(0, 0, -1), z_dir=(1, 0, 0))):
        with Locations((-23.555, 13.5)):
            Rectangle(ESBO_O1_W, ESBO_O1_H)
    ressalto_extrus_o1 = extrude(amount=RESSALTO_EXTRUS_O1_DEPTH)

    # Filete1
    filete1_edges = [part.edges().sort_by_distance(p)[0] for p in [
        (22.275, 13.5, 27.3),
    ]]
    fillet(filete1_edges, radius=FILETE1_R)

    # Filete2
    filete2_edges = [part.edges().sort_by_distance(p)[0] for p in [
        (22.275, 13.5, 19.81),
    ]]
    fillet(filete2_edges, radius=FILETE2_R)

    # Esboço2 → Corte-extrusão1 (cut)
    with BuildSketch(Plane(origin=(0, 15, 0), x_dir=(1, 0, 0), z_dir=(0, 1, 0))):
        with Locations(Location((18.385, -23.39, 0), (0, 0, 270))):
            Circle(ESBO_O2_R)
    corte_extrus_o1 = extrude(amount=-CORTE_EXTRUS_O1_DEPTH, mode=Mode.SUBTRACT)

    # Esboço3 → Ressalto-extrusão2 (add)
    with BuildSketch(Plane.XY.offset(4)):
        with Locations((18.47, 2.8)):
            Rectangle(ESBO_O3_W, ESBO_O3_H)
    ressalto_extrus_o2 = extrude(amount=RESSALTO_EXTRUS_O2_DEPTH)

    # Esboço5 → Corte-extrusão2 (cut, up to next)
    with BuildSketch(Plane(origin=(0, 3.8, 0), x_dir=(1, 0, 0), z_dir=(0, 1, 0)), mode=Mode.PRIVATE) as corte_extrus_o2_sk1:
        with Locations(Location((18.47, -10.875, 0), (0, 0, 180))):
            Circle(ESBO_O5_R)
    corte_extrus_o2_tool1 = extrude(corte_extrus_o2_sk1.sketch, amount=-CORTE_EXTRUS_O2_REACH, mode=Mode.PRIVATE) & part.part
    corte_extrus_o2 = corte_extrus_o2_tool1.solids().sort_by_distance((18.47, 3.8, 10.875))[0]
    add(corte_extrus_o2, mode=Mode.SUBTRACT)

    # Filete3
    filete3_edges = [part.edges().sort_by_distance(p)[0] for p in [
        (21.8, 2.8, 14.8),
    ]]
    fillet(filete3_edges, radius=FILETE3_R)

    # Filete4
    filete4_edges = [part.edges().sort_by_distance(p)[0] for p in [
        (15.14, 2.8, 14.8),
    ]]
    fillet(filete4_edges, radius=FILETE4_R - 0.0001)  # a hair under: the kernel refuses the full size

    # Espelhar5: Boss-Extrude3, Boss-Extrude4, Cut-Extrude5, Cut-Extrude6, Cut-Extrude8, Ressalto-extrusão1, Corte-extrusão1, Ressalto-extrusão2, Corte-extrusão2 across plane
    add(boss_extrude3.mirror(Plane.ZY))
    add(boss_extrude4.mirror(Plane.ZY))
    add(cut_extrude5.mirror(Plane.ZY), mode=Mode.SUBTRACT)
    add(cut_extrude6.mirror(Plane.ZY), mode=Mode.SUBTRACT)
    add(cut_extrude8.mirror(Plane.ZY), mode=Mode.SUBTRACT)
    add(ressalto_extrus_o1.mirror(Plane.ZY))
    add(corte_extrus_o1.mirror(Plane.ZY), mode=Mode.SUBTRACT)
    add(ressalto_extrus_o2.mirror(Plane.ZY))
    add(corte_extrus_o2.mirror(Plane.ZY), mode=Mode.SUBTRACT)

    # Fillet3 of Espelhar5
    fillet3_of_espelhar5_edges = [part.edges().sort_by_distance(p)[0] for p in [
        (-18.8, -4.475, 2),
        (-18.8, -12.475, 2),
        (-16.3, -12.475, 2),
        (-16.3, -4.475, 2),
    ]]
    fillet(fillet3_of_espelhar5_edges, radius=FILLET3_OF_ESPELHAR5_R)

    # Fillet6 of Espelhar5
    fillet6_of_espelhar5_edges = [part.edges().sort_by_distance(p)[0] for p in [
        (-15.8, -12.3, 35.7),
        (-15.8, -12.3, 43.2),
    ]]
    fillet(fillet6_of_espelhar5_edges, radius=FILLET6_OF_ESPELHAR5_R - 0.0001)  # a hair under: the kernel refuses the full size

    # Fillet8 of Espelhar5
    fillet8_of_espelhar5_edges = [part.edges().sort_by_distance(p)[0] for p in [
        (-21.8, 15, 2),
        (-21.8, -15, 2),
    ]]
    fillet(fillet8_of_espelhar5_edges, radius=FILLET8_OF_ESPELHAR5_R)

    # Filete1 of Espelhar5
    filete1_of_espelhar5_edges = [part.edges().sort_by_distance(p)[0] for p in [
        (-22.275, 13.5, 27.3),
    ]]
    fillet(filete1_of_espelhar5_edges, radius=FILETE1_OF_ESPELHAR5_R)

    # Filete2 of Espelhar5
    filete2_of_espelhar5_edges = [part.edges().sort_by_distance(p)[0] for p in [
        (-22.275, 13.5, 19.81),
    ]]
    fillet(filete2_of_espelhar5_edges, radius=FILETE2_OF_ESPELHAR5_R)

    # Filete3 of Espelhar5
    filete3_of_espelhar5_edges = [part.edges().sort_by_distance(p)[0] for p in [
        (-21.8, 2.8, 14.8),
    ]]
    fillet(filete3_of_espelhar5_edges, radius=FILETE3_OF_ESPELHAR5_R)

    # Filete4 of Espelhar5
    filete4_of_espelhar5_edges = [part.edges().sort_by_distance(p)[0] for p in [
        (-15.14, 2.8, 14.8),
    ]]
    fillet(filete4_of_espelhar5_edges, radius=FILETE4_OF_ESPELHAR5_R - 0.0001)  # a hair under: the kernel refuses the full size


solid = part.part
